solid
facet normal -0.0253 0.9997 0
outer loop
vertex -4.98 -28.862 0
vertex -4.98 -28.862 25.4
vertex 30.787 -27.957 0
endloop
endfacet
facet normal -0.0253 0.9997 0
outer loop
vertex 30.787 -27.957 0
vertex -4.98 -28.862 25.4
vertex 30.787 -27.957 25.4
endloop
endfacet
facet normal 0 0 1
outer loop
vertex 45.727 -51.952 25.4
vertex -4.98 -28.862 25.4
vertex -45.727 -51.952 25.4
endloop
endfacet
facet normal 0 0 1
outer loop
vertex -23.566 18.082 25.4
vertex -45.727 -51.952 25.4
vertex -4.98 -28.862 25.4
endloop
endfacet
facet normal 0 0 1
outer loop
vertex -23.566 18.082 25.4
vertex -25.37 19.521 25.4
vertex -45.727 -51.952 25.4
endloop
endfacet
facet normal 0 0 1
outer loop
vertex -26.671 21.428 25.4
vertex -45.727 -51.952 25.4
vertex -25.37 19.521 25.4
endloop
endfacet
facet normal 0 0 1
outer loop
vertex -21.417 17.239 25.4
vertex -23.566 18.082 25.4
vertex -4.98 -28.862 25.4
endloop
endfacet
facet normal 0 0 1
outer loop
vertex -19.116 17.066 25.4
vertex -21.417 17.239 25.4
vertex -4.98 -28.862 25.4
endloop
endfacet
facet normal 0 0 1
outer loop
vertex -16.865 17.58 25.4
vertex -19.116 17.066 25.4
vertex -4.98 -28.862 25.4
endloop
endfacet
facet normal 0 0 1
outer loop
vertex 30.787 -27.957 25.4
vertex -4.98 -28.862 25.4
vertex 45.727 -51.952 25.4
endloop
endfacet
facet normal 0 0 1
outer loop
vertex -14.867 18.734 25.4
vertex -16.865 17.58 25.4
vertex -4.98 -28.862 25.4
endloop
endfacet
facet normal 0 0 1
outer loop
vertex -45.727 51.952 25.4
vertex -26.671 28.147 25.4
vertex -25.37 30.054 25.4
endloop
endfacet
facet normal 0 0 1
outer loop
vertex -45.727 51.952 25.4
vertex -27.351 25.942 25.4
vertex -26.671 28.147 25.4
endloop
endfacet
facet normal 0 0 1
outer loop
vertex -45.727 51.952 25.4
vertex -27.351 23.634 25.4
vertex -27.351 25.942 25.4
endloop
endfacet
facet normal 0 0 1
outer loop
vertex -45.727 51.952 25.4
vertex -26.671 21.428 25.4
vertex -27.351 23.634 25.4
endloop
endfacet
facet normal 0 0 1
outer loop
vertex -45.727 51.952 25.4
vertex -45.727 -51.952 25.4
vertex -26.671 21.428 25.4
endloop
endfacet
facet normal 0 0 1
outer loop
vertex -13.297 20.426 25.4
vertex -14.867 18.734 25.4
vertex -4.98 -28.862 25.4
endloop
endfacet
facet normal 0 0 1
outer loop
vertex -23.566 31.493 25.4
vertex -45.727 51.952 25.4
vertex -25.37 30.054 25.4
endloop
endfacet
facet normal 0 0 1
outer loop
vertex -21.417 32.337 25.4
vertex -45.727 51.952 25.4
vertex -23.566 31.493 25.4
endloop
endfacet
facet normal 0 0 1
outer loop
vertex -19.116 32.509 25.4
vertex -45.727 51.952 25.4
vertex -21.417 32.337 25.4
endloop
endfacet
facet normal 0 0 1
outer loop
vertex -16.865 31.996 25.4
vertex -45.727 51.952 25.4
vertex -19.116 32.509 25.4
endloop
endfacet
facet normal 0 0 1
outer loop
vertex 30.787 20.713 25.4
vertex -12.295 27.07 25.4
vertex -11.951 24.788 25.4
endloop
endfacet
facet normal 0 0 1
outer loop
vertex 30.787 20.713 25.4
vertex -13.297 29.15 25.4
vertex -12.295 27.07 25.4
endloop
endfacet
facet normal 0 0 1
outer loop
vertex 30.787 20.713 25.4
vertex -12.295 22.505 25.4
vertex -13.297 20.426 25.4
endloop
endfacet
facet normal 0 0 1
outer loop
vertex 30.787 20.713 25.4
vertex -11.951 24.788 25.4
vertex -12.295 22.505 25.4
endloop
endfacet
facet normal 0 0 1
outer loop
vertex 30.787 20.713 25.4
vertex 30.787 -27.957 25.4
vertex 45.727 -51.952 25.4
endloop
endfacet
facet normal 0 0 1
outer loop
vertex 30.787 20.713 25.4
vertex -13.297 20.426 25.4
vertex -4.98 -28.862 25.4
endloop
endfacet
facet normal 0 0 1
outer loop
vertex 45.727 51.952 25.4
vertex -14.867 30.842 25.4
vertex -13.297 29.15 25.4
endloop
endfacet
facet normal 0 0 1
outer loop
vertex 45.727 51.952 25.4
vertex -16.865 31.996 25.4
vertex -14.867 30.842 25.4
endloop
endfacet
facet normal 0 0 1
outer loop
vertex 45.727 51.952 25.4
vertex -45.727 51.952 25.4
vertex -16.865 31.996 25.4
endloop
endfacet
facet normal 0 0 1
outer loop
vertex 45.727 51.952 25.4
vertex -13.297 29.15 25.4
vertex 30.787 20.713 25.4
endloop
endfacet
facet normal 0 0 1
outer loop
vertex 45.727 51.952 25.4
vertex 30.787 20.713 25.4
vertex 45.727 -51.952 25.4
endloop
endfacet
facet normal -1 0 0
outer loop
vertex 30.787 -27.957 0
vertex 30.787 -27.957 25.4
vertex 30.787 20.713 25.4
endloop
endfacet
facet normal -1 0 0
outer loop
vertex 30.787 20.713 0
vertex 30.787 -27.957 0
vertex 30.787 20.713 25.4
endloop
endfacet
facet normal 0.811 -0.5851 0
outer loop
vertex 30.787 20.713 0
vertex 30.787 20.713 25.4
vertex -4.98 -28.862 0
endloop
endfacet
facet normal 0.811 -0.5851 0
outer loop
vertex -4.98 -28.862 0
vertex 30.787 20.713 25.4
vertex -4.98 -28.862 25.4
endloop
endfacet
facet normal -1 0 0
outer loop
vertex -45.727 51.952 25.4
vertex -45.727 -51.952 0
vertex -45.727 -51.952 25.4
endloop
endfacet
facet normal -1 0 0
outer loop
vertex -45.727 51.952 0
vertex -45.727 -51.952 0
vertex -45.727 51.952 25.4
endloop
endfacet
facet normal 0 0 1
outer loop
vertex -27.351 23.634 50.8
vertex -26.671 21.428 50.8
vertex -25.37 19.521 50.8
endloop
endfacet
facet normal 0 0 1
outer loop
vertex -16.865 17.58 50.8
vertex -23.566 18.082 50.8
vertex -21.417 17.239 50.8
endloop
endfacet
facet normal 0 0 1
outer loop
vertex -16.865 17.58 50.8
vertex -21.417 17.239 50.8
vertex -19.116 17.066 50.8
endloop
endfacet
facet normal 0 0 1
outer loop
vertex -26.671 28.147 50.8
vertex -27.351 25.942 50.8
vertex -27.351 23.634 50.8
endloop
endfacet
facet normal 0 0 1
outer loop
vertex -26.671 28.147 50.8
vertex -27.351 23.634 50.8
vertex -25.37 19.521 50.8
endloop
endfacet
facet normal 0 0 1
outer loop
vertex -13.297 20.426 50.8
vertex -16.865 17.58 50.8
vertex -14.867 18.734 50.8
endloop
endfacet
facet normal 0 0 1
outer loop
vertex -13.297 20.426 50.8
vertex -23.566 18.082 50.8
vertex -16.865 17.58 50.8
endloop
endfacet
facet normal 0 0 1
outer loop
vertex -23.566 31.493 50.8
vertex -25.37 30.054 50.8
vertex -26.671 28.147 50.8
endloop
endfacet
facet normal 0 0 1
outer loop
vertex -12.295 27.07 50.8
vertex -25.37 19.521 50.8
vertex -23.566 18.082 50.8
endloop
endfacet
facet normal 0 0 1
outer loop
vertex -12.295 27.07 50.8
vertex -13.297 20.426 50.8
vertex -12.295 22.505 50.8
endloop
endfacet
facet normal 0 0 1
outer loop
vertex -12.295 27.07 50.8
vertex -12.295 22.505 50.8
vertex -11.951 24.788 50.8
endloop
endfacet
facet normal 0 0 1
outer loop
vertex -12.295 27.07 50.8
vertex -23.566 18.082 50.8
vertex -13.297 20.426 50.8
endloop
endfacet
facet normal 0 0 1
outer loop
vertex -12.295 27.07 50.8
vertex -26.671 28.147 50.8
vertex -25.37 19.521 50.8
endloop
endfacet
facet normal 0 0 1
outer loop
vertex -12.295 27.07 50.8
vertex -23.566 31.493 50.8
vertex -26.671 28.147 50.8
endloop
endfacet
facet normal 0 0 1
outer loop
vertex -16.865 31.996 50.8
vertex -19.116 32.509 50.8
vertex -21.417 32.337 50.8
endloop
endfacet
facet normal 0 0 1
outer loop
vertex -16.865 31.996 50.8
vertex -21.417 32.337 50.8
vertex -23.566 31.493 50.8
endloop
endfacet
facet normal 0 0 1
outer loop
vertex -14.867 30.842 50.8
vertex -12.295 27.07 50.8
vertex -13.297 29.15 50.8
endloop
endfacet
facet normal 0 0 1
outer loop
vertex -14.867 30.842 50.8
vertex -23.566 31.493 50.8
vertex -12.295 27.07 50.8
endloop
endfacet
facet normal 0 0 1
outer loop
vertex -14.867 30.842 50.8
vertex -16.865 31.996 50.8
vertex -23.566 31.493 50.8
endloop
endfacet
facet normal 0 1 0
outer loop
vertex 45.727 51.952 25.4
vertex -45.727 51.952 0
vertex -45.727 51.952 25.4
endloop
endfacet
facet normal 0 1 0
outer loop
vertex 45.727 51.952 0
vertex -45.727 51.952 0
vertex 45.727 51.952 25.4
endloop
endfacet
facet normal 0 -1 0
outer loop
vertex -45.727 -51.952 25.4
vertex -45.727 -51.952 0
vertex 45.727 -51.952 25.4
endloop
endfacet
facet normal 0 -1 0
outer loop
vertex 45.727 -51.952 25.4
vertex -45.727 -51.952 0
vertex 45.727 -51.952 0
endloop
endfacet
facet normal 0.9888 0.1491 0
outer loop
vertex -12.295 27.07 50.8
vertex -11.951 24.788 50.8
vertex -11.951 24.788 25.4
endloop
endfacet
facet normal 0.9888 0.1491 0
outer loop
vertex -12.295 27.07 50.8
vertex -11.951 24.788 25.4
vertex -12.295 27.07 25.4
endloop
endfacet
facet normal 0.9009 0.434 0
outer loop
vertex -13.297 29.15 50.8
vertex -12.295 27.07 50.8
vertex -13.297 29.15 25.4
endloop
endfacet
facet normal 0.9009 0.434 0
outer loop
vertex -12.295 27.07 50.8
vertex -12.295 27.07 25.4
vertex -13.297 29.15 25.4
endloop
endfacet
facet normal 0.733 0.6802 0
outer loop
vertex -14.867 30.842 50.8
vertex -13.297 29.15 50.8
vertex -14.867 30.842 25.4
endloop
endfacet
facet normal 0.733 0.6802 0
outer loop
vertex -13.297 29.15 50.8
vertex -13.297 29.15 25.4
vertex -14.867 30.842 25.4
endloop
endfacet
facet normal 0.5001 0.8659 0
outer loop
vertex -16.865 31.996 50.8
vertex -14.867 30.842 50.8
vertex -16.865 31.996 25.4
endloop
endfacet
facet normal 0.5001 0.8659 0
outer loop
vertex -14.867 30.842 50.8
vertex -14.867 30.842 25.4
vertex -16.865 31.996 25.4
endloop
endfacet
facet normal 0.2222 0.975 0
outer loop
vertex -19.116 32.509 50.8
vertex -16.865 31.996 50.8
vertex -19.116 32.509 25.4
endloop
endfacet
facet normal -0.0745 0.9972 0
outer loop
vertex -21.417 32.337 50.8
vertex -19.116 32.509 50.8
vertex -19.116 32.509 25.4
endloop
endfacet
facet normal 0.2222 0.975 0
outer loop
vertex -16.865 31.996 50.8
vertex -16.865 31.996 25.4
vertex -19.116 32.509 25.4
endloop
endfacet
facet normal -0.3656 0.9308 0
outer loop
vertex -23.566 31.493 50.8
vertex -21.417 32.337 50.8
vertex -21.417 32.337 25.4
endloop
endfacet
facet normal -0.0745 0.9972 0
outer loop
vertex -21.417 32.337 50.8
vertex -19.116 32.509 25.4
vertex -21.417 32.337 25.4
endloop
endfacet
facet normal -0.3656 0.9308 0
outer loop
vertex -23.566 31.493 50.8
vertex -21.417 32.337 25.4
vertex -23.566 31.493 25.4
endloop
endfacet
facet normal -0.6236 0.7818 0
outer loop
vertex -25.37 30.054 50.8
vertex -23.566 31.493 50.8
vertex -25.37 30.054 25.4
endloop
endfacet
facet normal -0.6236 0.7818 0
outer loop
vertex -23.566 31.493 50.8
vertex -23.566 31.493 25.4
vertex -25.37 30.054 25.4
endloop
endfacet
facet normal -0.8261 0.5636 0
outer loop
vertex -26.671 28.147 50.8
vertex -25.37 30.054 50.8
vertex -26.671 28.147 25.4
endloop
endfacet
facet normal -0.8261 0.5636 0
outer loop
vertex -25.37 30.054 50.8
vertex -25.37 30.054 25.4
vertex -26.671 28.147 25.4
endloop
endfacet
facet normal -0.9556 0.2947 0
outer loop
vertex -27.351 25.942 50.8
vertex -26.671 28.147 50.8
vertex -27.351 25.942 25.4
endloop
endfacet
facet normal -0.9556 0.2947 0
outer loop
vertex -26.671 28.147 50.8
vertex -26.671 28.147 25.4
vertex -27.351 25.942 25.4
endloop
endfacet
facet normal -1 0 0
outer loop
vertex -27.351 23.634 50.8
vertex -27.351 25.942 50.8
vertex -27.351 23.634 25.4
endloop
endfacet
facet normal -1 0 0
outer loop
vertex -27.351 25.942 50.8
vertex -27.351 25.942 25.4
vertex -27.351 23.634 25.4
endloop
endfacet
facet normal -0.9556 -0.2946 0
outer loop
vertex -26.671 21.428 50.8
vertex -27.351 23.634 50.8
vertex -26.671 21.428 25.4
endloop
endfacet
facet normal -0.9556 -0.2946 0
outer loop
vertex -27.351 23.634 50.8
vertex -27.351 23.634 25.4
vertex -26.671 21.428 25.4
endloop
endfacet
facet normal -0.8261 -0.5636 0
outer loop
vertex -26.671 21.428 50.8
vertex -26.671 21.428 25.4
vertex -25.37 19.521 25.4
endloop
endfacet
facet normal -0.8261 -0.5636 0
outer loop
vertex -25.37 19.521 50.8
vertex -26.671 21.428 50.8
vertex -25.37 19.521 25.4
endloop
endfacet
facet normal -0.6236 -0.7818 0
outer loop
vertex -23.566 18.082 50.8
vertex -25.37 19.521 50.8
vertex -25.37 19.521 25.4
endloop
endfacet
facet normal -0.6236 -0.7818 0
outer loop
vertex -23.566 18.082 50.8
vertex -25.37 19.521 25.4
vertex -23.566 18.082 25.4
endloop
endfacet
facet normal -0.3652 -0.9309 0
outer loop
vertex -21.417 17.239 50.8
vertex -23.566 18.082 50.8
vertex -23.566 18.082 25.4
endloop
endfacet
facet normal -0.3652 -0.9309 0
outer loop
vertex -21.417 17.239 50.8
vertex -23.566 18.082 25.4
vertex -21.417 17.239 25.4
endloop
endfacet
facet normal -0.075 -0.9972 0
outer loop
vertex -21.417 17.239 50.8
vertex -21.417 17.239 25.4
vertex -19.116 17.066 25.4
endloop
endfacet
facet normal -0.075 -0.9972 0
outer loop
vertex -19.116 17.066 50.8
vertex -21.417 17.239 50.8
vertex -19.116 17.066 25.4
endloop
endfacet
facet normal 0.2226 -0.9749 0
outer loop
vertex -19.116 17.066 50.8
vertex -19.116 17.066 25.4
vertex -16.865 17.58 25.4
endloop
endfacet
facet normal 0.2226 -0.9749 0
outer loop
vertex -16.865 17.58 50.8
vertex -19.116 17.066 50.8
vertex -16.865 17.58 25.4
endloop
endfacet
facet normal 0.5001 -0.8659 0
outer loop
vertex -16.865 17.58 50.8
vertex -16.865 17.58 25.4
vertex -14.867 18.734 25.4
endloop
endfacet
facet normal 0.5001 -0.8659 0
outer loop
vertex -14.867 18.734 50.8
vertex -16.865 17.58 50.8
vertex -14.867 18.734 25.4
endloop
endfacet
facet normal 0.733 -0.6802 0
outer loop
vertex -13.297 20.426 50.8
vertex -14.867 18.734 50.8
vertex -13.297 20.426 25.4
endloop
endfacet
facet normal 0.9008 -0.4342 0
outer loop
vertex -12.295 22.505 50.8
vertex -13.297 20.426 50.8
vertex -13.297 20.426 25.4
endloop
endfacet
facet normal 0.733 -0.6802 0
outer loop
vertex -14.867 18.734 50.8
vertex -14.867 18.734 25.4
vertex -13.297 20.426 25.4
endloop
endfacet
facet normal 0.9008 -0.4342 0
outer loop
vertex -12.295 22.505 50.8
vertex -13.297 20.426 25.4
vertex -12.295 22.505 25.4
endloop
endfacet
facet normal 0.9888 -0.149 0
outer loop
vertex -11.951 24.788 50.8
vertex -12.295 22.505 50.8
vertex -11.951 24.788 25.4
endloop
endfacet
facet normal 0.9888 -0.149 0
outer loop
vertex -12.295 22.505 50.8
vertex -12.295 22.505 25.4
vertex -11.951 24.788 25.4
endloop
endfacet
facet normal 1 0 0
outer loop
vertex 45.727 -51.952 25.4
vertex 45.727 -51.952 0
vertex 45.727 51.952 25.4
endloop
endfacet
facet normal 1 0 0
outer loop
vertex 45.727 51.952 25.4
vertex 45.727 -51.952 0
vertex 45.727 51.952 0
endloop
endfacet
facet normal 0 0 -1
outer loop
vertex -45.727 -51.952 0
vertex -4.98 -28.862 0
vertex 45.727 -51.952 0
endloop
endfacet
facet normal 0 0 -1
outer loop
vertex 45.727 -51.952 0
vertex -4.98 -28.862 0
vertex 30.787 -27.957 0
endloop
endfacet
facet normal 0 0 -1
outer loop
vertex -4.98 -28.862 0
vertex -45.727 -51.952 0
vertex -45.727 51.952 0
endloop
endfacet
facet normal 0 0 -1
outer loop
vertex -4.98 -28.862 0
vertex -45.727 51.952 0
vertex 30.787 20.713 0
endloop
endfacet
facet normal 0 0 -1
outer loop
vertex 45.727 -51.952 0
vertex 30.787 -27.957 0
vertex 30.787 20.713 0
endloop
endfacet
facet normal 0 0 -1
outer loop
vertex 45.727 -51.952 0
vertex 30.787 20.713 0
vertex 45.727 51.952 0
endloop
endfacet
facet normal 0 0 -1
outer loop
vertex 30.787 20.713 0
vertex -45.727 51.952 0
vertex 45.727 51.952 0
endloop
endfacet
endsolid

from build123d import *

# Parameters (mm, degrees)
F0_W     = 91.4542
F0_H     = 103.904634
F1_DEPTH = 25.4
F2_R     = 7.743106
F3_DEPTH = 25.4
F4_DEPTH = 25.4


with BuildPart() as f1:
    # F0 (on Top) → F1 (new body)
    with BuildSketch(Plane.XY):
        Rectangle(F0_W, F0_H)
    extrude(amount=F1_DEPTH)

    # F2 (on face) → F3 (join)
    with BuildSketch(Plane.XY.offset(25.4)):
        with Locations((-19.694343, 24.787709)):
            Circle(F2_R)
    extrude(amount=F3_DEPTH)

    # F2 (on face) → F4 (cut)
    with BuildSketch(Plane.XY.offset(25.4)):
        Polygon((30.786563, 20.713016), (-4.980177, -28.8624), (30.786563, -27.956914), align=None)
    extrude(amount=-F4_DEPTH, mode=Mode.SUBTRACT)


solid = f1.part
